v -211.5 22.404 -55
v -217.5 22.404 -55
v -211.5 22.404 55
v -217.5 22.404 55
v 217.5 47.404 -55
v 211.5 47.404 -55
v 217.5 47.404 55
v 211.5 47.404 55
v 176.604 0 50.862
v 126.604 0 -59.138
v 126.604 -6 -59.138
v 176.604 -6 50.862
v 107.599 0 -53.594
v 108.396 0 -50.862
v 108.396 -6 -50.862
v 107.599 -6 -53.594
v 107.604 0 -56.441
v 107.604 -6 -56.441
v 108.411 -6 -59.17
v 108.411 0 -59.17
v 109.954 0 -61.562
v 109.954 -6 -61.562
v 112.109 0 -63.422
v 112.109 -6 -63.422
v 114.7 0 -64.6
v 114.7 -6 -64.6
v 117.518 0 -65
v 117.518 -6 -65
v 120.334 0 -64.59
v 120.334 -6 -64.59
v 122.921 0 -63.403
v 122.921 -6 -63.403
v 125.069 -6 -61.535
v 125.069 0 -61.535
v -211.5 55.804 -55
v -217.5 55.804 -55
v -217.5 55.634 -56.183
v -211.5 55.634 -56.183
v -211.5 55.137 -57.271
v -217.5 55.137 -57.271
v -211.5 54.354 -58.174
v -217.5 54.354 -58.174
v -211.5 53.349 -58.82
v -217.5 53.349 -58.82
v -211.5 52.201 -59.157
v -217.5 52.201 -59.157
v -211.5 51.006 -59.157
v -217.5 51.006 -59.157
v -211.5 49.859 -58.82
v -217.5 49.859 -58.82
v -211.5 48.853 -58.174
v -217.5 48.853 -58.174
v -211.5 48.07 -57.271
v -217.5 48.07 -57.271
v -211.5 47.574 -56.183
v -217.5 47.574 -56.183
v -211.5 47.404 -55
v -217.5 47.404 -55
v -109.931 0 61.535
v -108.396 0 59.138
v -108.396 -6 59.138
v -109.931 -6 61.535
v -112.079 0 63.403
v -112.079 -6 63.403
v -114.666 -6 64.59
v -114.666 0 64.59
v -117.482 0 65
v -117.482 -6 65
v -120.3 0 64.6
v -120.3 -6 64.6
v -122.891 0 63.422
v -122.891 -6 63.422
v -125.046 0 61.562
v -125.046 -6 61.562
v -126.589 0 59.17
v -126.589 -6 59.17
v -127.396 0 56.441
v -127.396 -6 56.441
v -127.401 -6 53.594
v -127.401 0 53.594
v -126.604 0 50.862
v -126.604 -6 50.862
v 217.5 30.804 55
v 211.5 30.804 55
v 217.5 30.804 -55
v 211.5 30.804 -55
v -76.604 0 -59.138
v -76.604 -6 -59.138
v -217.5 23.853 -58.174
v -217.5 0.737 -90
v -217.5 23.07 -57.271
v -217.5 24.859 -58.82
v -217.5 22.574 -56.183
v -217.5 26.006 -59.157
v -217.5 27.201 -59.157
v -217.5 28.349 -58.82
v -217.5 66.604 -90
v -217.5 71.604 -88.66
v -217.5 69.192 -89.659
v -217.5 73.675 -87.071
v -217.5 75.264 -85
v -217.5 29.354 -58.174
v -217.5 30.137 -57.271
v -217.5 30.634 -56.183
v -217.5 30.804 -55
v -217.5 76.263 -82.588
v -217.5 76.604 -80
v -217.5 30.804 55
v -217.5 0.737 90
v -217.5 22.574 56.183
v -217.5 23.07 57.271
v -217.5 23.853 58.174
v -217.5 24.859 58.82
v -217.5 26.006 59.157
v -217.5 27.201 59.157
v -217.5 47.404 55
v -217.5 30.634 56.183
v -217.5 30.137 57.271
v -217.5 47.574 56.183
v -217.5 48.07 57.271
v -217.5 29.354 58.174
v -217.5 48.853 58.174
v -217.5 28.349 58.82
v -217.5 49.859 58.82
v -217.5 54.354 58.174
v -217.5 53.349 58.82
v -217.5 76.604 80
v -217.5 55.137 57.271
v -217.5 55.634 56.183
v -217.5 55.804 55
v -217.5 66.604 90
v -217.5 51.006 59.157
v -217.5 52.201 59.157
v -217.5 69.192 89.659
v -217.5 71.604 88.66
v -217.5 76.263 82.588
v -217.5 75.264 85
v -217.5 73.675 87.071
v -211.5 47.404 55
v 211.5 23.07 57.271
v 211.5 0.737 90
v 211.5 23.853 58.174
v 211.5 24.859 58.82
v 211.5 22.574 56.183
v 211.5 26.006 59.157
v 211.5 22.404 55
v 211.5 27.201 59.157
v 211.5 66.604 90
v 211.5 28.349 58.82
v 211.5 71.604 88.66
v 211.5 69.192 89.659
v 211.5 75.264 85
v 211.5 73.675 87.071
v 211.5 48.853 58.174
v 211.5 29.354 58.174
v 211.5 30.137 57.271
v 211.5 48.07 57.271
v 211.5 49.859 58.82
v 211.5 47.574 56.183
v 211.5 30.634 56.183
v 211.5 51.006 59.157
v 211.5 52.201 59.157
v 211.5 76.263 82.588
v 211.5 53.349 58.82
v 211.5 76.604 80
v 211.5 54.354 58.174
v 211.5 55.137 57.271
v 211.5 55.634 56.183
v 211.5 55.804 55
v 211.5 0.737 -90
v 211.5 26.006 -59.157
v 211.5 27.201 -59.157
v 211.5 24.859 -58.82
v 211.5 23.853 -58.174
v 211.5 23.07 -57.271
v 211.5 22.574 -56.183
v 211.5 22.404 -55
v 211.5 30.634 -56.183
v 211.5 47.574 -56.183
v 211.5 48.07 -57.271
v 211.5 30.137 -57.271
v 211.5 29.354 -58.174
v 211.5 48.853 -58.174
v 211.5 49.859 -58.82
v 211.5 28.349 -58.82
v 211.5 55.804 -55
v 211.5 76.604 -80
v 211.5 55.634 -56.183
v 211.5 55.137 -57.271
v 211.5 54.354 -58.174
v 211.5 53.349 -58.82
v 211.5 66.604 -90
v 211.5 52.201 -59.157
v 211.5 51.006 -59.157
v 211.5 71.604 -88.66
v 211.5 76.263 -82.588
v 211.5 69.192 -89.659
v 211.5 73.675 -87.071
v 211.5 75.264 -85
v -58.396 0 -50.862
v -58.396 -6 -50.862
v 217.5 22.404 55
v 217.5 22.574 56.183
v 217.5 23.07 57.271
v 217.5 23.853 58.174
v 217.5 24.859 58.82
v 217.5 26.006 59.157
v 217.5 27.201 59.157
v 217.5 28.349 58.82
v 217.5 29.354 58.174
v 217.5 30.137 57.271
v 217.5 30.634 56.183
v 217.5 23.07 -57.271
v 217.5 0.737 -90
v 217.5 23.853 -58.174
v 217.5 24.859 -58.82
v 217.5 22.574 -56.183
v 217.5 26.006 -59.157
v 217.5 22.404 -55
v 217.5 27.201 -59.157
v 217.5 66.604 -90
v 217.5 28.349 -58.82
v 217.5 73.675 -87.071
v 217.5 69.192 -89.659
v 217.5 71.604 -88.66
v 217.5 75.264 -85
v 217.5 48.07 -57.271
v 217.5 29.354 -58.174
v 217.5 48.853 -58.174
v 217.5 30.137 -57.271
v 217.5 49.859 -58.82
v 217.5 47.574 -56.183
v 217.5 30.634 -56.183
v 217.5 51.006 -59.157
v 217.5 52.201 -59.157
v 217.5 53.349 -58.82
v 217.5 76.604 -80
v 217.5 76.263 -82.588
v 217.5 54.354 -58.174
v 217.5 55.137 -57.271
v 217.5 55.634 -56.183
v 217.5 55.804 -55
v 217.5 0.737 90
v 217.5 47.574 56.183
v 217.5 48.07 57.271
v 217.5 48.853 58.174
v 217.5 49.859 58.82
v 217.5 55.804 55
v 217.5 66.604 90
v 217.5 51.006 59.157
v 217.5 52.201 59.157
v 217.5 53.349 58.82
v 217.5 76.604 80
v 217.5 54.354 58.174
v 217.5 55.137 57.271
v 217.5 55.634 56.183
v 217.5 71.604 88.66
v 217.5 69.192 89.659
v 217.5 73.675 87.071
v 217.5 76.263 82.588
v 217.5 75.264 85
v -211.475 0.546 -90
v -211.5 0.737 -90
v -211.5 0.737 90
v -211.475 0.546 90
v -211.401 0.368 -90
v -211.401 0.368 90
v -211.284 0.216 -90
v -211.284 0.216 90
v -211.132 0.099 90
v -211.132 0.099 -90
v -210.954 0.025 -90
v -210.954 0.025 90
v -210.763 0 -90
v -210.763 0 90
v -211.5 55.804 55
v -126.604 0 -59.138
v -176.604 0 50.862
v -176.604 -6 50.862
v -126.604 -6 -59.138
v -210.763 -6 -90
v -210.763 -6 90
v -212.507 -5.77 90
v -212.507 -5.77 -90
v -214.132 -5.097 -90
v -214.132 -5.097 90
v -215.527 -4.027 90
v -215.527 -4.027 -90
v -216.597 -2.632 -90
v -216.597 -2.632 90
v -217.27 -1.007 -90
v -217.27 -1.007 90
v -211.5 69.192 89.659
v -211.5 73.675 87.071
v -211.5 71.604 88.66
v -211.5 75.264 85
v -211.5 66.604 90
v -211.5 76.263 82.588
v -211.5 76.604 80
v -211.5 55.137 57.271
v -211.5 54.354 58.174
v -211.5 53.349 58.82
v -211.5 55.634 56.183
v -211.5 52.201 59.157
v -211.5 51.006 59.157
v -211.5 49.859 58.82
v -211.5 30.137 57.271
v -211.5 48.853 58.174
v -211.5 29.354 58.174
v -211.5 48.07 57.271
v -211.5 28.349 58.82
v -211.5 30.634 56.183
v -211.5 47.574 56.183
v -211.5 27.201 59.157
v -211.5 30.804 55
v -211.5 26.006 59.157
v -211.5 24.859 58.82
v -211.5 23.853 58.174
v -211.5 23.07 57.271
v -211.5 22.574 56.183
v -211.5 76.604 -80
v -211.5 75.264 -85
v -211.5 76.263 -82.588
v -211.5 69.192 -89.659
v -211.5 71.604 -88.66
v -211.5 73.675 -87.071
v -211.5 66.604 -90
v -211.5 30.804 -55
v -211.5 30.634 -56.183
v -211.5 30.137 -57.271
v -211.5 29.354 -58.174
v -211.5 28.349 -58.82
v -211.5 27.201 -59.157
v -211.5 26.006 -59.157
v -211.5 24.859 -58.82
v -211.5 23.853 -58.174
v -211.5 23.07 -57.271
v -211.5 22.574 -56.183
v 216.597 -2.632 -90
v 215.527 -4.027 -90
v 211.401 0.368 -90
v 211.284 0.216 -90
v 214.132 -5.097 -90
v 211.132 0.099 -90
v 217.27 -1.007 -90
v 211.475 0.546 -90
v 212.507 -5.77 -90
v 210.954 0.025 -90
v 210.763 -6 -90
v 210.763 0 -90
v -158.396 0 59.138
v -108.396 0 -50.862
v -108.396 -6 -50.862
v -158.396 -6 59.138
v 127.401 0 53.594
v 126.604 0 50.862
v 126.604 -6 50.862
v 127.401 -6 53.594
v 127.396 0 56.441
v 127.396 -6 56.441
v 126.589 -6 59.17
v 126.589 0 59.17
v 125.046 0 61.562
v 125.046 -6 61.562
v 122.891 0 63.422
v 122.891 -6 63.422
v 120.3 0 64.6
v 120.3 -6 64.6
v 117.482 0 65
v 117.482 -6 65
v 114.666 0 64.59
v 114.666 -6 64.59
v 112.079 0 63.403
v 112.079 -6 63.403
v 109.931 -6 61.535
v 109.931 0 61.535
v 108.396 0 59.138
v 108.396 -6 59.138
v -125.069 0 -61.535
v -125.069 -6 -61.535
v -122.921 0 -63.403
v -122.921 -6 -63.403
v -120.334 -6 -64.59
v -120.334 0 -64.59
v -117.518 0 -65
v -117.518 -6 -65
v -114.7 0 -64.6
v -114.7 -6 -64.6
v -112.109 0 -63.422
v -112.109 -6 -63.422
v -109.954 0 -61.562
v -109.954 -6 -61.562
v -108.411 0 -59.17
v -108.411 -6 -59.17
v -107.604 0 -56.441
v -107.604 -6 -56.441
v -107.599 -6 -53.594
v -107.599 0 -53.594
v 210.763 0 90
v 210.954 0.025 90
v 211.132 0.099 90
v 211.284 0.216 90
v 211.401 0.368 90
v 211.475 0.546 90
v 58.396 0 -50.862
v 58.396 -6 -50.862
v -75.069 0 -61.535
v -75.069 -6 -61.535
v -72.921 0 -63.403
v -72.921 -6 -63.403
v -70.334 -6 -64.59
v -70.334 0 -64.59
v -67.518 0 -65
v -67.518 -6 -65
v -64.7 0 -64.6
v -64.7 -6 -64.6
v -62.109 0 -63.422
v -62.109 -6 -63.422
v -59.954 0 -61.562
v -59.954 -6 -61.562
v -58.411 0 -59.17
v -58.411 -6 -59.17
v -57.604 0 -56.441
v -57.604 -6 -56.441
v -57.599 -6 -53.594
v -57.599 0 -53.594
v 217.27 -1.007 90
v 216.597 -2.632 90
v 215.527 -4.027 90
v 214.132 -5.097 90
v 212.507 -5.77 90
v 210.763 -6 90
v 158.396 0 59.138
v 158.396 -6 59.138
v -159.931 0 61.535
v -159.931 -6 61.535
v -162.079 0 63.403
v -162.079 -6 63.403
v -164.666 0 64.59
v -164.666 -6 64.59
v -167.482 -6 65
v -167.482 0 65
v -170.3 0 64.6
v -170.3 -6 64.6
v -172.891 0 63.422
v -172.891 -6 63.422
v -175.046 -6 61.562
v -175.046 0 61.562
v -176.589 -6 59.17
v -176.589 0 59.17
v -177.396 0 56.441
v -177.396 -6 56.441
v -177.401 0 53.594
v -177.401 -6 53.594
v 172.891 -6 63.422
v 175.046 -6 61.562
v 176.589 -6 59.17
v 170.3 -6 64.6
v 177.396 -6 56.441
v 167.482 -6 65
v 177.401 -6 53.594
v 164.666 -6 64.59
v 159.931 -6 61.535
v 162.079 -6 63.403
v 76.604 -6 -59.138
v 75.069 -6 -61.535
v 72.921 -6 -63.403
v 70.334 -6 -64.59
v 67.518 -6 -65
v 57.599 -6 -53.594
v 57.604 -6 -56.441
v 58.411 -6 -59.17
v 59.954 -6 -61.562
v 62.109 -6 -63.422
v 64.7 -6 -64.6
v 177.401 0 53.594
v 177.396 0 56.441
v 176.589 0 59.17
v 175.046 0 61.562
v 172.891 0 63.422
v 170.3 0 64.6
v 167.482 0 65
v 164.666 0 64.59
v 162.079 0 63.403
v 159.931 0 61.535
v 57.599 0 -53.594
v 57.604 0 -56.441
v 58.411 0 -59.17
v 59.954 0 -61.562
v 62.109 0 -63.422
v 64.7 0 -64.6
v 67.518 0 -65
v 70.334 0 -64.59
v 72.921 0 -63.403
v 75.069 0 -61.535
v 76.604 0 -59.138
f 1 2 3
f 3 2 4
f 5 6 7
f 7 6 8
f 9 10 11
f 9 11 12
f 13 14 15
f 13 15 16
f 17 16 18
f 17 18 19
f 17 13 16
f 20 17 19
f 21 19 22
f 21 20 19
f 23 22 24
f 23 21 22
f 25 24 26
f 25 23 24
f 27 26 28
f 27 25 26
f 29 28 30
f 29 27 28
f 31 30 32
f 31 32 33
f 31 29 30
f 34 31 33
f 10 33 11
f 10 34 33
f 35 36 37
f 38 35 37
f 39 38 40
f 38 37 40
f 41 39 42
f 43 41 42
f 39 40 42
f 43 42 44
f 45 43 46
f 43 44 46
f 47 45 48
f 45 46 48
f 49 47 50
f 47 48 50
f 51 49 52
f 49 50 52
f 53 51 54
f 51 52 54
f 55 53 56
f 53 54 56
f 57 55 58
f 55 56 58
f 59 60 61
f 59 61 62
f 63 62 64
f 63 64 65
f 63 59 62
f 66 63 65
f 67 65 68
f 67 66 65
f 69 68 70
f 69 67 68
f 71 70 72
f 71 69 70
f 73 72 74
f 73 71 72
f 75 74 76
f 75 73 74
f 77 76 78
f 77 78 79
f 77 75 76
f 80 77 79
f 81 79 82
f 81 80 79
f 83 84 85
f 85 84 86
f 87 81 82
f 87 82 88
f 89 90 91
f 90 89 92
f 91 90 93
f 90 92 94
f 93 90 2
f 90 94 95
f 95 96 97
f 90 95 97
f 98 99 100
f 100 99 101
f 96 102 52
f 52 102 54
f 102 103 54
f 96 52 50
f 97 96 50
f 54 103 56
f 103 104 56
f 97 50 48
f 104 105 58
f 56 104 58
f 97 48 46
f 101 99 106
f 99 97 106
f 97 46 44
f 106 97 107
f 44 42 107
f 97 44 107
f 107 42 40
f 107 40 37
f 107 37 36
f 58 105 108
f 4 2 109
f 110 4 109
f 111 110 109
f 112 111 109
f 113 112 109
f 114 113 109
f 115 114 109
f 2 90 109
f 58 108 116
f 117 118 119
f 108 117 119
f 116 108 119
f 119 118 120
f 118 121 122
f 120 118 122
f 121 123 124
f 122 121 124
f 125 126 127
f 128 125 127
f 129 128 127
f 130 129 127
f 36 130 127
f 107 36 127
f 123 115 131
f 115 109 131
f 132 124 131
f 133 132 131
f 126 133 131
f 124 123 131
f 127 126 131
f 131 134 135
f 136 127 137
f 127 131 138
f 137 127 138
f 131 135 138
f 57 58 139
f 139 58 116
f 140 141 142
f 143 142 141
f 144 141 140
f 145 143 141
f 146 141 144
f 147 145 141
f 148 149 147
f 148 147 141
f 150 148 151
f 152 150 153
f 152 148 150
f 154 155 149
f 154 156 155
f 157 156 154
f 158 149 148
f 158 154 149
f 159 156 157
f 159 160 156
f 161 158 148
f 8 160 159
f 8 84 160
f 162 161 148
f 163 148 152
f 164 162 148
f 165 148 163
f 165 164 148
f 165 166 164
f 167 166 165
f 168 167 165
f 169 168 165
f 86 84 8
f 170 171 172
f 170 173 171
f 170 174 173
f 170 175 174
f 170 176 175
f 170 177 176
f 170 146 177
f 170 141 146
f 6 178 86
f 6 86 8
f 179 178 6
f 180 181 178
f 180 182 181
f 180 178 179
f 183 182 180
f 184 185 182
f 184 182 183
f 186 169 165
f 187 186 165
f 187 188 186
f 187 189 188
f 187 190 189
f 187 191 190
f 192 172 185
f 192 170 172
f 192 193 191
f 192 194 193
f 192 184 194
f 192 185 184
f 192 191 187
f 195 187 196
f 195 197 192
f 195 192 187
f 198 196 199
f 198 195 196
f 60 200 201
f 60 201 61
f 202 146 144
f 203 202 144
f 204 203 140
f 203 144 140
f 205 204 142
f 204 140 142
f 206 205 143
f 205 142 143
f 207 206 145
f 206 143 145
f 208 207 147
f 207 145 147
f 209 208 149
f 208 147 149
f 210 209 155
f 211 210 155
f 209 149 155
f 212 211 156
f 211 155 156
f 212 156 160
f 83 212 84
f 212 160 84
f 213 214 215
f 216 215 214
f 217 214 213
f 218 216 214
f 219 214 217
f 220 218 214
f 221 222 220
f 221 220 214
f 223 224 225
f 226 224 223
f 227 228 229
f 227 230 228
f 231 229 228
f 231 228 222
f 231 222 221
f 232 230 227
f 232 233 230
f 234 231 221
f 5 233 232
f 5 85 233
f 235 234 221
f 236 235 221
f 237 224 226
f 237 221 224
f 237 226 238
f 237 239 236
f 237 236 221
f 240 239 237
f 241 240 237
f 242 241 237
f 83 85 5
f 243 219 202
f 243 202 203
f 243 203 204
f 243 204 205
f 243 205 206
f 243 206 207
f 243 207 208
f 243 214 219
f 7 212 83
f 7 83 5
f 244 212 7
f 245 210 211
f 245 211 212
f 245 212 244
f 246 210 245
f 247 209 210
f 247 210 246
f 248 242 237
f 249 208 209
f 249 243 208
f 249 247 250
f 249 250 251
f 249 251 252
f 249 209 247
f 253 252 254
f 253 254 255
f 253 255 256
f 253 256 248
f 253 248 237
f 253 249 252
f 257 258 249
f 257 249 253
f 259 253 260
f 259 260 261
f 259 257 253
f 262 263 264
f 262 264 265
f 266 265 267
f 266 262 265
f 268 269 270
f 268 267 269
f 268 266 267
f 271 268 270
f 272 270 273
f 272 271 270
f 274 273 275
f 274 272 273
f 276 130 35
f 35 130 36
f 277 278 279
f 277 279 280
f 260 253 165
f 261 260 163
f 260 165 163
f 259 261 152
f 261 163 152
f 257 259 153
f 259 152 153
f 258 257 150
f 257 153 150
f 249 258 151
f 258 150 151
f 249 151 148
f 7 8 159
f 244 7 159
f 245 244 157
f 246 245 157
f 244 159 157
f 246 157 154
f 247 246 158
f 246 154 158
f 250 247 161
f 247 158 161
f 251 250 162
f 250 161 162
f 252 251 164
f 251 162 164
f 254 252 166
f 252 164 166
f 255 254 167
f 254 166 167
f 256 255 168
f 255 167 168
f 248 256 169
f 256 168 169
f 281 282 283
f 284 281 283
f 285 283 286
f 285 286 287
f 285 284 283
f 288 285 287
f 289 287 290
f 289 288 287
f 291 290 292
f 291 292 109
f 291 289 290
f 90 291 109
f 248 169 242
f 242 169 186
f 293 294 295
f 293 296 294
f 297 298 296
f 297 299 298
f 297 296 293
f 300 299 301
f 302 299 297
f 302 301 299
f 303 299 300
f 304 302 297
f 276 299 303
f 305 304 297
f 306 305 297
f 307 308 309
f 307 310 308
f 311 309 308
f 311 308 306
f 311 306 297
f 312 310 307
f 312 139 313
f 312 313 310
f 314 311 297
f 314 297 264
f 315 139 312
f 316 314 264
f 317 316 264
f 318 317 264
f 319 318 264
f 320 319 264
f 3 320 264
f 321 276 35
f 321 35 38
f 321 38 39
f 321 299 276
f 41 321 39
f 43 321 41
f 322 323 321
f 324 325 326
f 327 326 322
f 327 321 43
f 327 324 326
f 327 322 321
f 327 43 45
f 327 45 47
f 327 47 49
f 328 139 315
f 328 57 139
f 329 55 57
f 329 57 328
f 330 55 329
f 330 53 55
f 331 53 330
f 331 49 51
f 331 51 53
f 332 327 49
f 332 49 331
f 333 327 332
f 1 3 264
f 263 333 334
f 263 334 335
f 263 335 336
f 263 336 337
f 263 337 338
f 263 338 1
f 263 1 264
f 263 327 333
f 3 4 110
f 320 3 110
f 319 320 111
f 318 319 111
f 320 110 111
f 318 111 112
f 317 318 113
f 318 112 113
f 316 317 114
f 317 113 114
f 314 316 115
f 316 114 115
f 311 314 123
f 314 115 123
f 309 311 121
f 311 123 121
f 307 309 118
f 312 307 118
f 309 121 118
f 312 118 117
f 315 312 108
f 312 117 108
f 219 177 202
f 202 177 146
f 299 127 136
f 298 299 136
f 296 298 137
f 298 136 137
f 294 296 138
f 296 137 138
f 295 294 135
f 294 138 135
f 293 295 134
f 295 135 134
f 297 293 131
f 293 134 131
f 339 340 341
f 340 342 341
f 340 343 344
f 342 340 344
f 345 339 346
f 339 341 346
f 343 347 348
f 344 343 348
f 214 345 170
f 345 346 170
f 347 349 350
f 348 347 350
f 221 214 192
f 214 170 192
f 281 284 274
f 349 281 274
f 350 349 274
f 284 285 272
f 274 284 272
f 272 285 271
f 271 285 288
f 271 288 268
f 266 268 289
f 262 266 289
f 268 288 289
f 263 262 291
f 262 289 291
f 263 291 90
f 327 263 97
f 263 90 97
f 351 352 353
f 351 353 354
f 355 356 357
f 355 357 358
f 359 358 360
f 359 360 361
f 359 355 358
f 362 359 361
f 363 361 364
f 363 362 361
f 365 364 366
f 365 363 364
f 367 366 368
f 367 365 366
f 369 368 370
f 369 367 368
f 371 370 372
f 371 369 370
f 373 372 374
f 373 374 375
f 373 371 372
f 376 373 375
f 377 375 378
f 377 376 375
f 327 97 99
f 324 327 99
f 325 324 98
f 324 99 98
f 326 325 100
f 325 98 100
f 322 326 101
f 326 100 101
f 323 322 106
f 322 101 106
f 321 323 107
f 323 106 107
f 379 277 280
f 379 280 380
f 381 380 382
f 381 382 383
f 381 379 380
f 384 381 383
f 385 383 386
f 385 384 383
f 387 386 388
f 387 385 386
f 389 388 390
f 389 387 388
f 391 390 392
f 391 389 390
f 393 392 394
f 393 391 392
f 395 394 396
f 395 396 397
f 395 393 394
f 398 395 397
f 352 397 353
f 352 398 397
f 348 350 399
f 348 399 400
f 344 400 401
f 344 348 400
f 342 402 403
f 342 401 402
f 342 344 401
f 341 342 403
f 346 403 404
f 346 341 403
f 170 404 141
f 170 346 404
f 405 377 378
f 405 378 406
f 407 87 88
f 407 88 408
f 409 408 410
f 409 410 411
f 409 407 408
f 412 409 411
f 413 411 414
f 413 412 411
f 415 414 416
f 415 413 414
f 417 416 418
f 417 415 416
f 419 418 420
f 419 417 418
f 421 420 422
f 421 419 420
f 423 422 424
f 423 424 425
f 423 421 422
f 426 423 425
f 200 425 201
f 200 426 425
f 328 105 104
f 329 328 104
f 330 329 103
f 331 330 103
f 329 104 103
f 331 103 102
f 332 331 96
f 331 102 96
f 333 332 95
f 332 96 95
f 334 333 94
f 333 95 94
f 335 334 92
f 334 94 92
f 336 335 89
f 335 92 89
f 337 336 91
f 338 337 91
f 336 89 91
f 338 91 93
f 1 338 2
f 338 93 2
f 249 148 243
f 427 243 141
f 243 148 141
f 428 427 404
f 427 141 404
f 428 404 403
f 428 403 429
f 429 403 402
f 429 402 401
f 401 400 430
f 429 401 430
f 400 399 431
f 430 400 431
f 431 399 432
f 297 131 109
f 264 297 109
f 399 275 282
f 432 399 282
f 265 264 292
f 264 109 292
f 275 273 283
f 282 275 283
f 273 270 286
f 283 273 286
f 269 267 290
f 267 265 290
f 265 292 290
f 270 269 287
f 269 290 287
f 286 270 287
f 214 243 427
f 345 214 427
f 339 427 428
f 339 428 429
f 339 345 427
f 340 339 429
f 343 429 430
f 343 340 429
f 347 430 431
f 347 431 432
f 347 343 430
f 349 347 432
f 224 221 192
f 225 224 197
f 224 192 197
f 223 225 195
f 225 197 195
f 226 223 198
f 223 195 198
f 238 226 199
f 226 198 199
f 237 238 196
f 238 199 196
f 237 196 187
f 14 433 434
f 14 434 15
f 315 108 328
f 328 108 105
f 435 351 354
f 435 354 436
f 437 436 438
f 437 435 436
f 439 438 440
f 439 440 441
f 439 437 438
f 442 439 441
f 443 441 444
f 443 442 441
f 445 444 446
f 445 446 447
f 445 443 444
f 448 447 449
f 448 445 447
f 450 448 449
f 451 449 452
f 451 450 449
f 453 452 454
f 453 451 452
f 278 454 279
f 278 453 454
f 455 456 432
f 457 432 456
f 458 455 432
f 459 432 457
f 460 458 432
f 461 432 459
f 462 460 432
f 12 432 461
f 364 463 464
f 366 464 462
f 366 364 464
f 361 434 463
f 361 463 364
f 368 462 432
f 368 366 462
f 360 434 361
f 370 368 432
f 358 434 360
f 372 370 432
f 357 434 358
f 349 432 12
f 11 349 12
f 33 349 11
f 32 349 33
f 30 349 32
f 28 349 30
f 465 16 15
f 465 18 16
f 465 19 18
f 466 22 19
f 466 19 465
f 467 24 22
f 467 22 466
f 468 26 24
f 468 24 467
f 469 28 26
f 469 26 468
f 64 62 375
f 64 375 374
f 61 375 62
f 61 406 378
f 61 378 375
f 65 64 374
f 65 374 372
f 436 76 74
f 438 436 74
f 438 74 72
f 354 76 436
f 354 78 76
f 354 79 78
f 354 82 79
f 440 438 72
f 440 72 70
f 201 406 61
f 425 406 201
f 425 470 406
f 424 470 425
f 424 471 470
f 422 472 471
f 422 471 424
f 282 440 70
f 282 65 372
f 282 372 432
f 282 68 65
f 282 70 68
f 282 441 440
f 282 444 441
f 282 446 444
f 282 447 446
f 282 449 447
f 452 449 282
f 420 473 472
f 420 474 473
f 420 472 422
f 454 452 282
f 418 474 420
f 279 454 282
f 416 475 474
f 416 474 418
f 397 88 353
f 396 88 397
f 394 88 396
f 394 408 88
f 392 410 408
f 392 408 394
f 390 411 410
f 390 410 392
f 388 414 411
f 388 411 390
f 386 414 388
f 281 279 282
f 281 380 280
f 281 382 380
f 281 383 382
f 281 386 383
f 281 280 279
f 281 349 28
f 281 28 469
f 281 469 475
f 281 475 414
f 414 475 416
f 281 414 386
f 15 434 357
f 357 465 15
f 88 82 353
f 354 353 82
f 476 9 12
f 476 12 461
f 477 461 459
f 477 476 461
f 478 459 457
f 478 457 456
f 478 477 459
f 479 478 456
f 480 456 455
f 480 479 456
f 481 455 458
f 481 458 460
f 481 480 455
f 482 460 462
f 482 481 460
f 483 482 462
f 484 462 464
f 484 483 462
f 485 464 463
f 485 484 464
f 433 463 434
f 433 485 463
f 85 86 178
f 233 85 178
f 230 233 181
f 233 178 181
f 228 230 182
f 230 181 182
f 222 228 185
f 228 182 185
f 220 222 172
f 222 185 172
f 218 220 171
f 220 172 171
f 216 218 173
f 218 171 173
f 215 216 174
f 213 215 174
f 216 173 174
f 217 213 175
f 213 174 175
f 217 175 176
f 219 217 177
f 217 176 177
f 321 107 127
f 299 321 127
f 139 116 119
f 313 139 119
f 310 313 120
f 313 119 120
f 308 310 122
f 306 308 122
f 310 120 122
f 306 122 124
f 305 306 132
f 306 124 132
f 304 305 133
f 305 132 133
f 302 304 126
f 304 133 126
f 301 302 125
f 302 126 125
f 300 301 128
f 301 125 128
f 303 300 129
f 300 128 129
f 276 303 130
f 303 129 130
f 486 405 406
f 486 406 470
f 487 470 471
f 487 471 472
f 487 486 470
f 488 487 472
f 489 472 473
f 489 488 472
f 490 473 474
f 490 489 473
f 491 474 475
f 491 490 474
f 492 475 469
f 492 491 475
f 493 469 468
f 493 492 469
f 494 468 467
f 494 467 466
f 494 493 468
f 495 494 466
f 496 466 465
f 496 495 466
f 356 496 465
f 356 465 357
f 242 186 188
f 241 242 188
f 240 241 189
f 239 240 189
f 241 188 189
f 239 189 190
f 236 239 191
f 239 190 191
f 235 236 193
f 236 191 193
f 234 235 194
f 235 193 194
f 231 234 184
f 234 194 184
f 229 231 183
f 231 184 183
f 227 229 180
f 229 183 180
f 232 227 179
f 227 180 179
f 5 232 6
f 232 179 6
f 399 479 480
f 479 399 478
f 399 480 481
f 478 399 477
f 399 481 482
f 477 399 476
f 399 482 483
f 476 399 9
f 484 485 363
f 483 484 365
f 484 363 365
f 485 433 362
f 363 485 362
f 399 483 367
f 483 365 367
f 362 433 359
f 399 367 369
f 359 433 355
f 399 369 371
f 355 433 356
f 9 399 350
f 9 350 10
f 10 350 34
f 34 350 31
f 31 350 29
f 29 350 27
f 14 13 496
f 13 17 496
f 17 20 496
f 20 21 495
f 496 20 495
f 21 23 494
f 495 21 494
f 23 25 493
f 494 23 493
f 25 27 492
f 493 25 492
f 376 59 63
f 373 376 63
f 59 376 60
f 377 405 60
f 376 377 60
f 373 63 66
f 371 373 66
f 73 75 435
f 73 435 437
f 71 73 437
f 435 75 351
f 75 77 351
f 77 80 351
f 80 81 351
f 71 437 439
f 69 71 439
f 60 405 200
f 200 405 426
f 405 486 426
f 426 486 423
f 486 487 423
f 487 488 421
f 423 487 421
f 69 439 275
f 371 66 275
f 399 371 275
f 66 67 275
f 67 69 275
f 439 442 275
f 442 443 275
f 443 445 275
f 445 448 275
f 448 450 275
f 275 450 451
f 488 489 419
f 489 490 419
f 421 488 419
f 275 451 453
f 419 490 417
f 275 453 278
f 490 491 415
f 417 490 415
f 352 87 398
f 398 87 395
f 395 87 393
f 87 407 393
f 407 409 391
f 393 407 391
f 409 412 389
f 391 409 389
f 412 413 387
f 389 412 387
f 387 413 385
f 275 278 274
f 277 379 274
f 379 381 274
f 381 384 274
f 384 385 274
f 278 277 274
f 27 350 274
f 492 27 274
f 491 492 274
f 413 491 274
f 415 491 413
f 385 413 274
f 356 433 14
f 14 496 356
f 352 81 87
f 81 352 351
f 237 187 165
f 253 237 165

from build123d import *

# Parameters (mm, degrees)
BASE_FLANGE1_DEPTH         = 6
SKETCHED_START             = -292.5
SKETCHED_BEND1_OUTLINE_W   = 6
SKETCHED_BEND1_OUTLINE_H   = 180
SKETCHED_BEND1_DEPTH       = 75
SKETCHED_START_2           = 217.5
SKETCHED_BEND1_2_OUTLINE_W = 6
SKETCHED_BEND1_2_OUTLINE_H = 180
SKETCHED_BEND1_2_DEPTH     = 75
SKETCHED_START_3           = -217.5
SKETCHED_BEND1_3_DEPTH     = 6.7366
SKETCHED_START_4           = 210.7634
SKETCHED_BEND1_4_DEPTH     = 6.7366
SKETCHED_START_5           = -91
SKETCHED_BEND1_5_DEPTH     = 182


with BuildPart() as part:
    # Base-Flange1: sheet metal written as solids
    # Sketch1 → Base-Flange1 (new body)
    with BuildSketch(Plane(origin=(0, 0, 0), x_dir=(1, 0, 0), z_dir=(0, 1, 0))):
        with BuildLine():
            Line((-282.5, 90), (282.5, 90))
            ThreePointArc((282.5, 90), (289.571067812, 87.071067812), (292.5, 80))
            Line((292.5, 80), (292.5, -80))
            ThreePointArc((292.5, -80), (289.571067812, -87.071067812), (282.5, -90))
            Line((282.5, -90), (-282.5, -90))
            ThreePointArc((-282.5, -90), (-289.571067812, -87.071067812), (-292.5, -80))
            Line((-292.5, -80), (-292.5, 80))
            ThreePointArc((-292.5, 80), (-289.571067812, 87.071067812), (-282.5, 90))
        make_face()
        with BuildLine():
            Line((-263.3, 55), (-263.3, -55))
            ThreePointArc((-263.3, -55), (-267.5, -59.2), (-271.7, -55))
            Line((-271.7, -55), (-271.7, 55))
            ThreePointArc((-271.7, 55), (-267.5, 59.2), (-263.3, 55))
        make_face(mode=Mode.SUBTRACT)
        with BuildLine():
            Line((-238.3, 55), (-238.3, -55))
            ThreePointArc((-238.3, -55), (-242.5, -59.2), (-246.7, -55))
            Line((-246.7, -55), (-246.7, 55))
            ThreePointArc((-246.7, 55), (-242.5, 59.2), (-238.3, 55))
        make_face(mode=Mode.SUBTRACT)
        with BuildLine():
            Line((246.7, 55), (246.7, -55))
            ThreePointArc((246.7, -55), (242.5, -59.2), (238.3, -55))
            Line((238.3, -55), (238.3, 55))
            ThreePointArc((238.3, 55), (242.5, 59.2), (246.7, 55))
        make_face(mode=Mode.SUBTRACT)
        with BuildLine():
            Line((271.7, 55), (271.7, -55))
            ThreePointArc((271.7, -55), (267.5, -59.2), (263.3, -55))
            Line((263.3, -55), (263.3, 55))
            ThreePointArc((263.3, 55), (267.5, 59.2), (271.7, 55))
        make_face(mode=Mode.SUBTRACT)
        with BuildLine():
            Line((-108.396335225, 50.861970557), (-158.396335225, -59.138029443))
            ThreePointArc((-158.396335225, -59.138029443), (-171.638029443, -64.103664775), (-176.603664775, -50.861970557))
            Line((-176.603664775, -50.861970557), (-126.603664775, 59.138029443))
            ThreePointArc((-126.603664775, 59.138029443), (-113.361970557, 64.103664775), (-108.396335225, 50.861970557))
        make_face(mode=Mode.SUBTRACT)
        with BuildLine():
            Line((-58.396335225, 50.861970557), (-108.396335225, -59.138029443))
            ThreePointArc((-108.396335225, -59.138029443), (-121.638029443, -64.103664775), (-126.603664775, -50.861970557))
            Line((-126.603664775, -50.861970557), (-76.603664775, 59.138029443))
            ThreePointArc((-76.603664775, 59.138029443), (-63.361970557, 64.103664775), (-58.396335225, 50.861970557))
        make_face(mode=Mode.SUBTRACT)
        with BuildLine():
            Line((76.603664775, 59.138029443), (126.603664775, -50.861970557))
            ThreePointArc((126.603664775, -50.861970557), (121.638029443, -64.103664775), (108.396335225, -59.138029443))
            Line((108.396335225, -59.138029443), (58.396335225, 50.861970557))
            ThreePointArc((58.396335225, 50.861970557), (63.361970557, 64.103664775), (76.603664775, 59.138029443))
        make_face(mode=Mode.SUBTRACT)
        with BuildLine():
            Line((126.603664775, 59.138029443), (176.603664775, -50.861970557))
            ThreePointArc((176.603664775, -50.861970557), (171.638029443, -64.103664775), (158.396335225, -59.138029443))
            Line((158.396335225, -59.138029443), (108.396335225, 50.861970557))
            ThreePointArc((108.396335225, 50.861970557), (113.361970557, 64.103664775), (126.603664775, 59.138029443))
        make_face(mode=Mode.SUBTRACT)
    extrude(amount=-BASE_FLANGE1_DEPTH)

    # Sketched Bend1: read off the stored shape, not the designer's step
    # Sketched Bend1 outline → Sketched Bend1 (cut)
    with BuildSketch(Plane.YZ.offset(SKETCHED_START)):
        with Locations((-3, 0)):
            Rectangle(SKETCHED_BEND1_OUTLINE_W, SKETCHED_BEND1_OUTLINE_H)
    extrude(amount=SKETCHED_BEND1_DEPTH, mode=Mode.SUBTRACT)

    # Sketched Bend1 2 outline → Sketched Bend1 2 (cut)
    with BuildSketch(Plane.YZ.offset(SKETCHED_START_2)):
        with Locations((-3, 0)):
            Rectangle(SKETCHED_BEND1_2_OUTLINE_W, SKETCHED_BEND1_2_OUTLINE_H)
    extrude(amount=SKETCHED_BEND1_2_DEPTH, mode=Mode.SUBTRACT)

    # Sketched Bend1 3 outline → Sketched Bend1 3 (add)
    with BuildSketch(Plane.YZ.offset(SKETCHED_START_3)):
        with BuildLine():
            Line((0, 90), (0, -90))
            Line((0, -90), (66.603762445, -90))
            ThreePointArc((66.603762445, -90), (73.674830257, -87.071067812), (76.603762445, -80))
            Line((76.603762445, -80), (76.603762445, 80))
            ThreePointArc((76.603762445, 80), (73.674830257, 87.071067812), (66.603762445, 90))
            Line((66.603762445, 90), (0, 90))
        make_face()
        with BuildLine():
            ThreePointArc((22.403762445, 55), (26.603762445, 59.2), (30.803762445, 55))
            Line((30.803762445, 55), (30.803762445, -55))
            ThreePointArc((30.803762445, -55), (26.603762445, -59.2), (22.403762445, -55))
            Line((22.403762445, -55), (22.403762445, 55))
        make_face(mode=Mode.SUBTRACT)
        with BuildLine():
            ThreePointArc((47.403762445, 55), (51.603762445, 59.2), (55.803762445, 55))
            Line((55.803762445, 55), (55.803762445, -55))
            ThreePointArc((55.803762445, -55), (51.603762445, -59.2), (47.403762445, -55))
            Line((47.403762445, -55), (47.403762445, 55))
        make_face(mode=Mode.SUBTRACT)
    extrude(amount=SKETCHED_BEND1_3_DEPTH)

    # Sketched Bend1 4 outline → Sketched Bend1 4 (add)
    with BuildSketch(Plane.YZ.offset(SKETCHED_START_4)):
        with BuildLine():
            Line((0, 90), (0, -90))
            Line((0, -90), (66.603762445, -90))
            ThreePointArc((66.603762445, -90), (73.674830257, -87.071067812), (76.603762445, -80))
            Line((76.603762445, -80), (76.603762445, 80))
            ThreePointArc((76.603762445, 80), (73.674830257, 87.071067812), (66.603762445, 90))
            Line((66.603762445, 90), (0, 90))
        make_face()
        with BuildLine():
            ThreePointArc((22.403762445, 55), (26.603762445, 59.2), (30.803762445, 55))
            Line((30.803762445, 55), (30.803762445, -55))
            ThreePointArc((30.803762445, -55), (26.603762445, -59.2), (22.403762445, -55))
            Line((22.403762445, -55), (22.403762445, 55))
        make_face(mode=Mode.SUBTRACT)
        with BuildLine():
            ThreePointArc((47.403762445, 55), (51.603762445, 59.2), (55.803762445, 55))
            Line((55.803762445, 55), (55.803762445, -55))
            ThreePointArc((55.803762445, -55), (51.603762445, -59.2), (47.403762445, -55))
            Line((47.403762445, -55), (47.403762445, 55))
        make_face(mode=Mode.SUBTRACT)
    extrude(amount=SKETCHED_BEND1_4_DEPTH)

    # Sketched Bend1 5 outline → Sketched Bend1 5 (cut)
    with BuildSketch(Plane.XY.offset(SKETCHED_START_5)):
        with BuildLine():
            Line((-217.5, -6), (-210.7634, -6))
            ThreePointArc((-210.7634, -6), (-215.526895542, -4.026895542), (-217.5, 0.7366))
            Line((-217.5, 0.7366), (-217.5, -6))
        make_face()
        with BuildLine():
            ThreePointArc((217.5, 0.7366), (215.526895542, -4.026895542), (210.7634, -6))
            Line((210.7634, -6), (217.5, -6))
            Line((217.5, -6), (217.5, 0.7366))
        make_face()
        with BuildLine():
            Line((-210.7634, 0), (-210.7634, 76.603762445))
            Line((-210.7634, 76.603762445), (-211.5, 76.603762445))
            Line((-211.5, 76.603762445), (-211.5, 0.7366))
            ThreePointArc((-211.5, 0.7366), (-211.284254855, 0.215745145), (-210.7634, 0))
        make_face()
        with BuildLine():
            ThreePointArc((210.7634, 0), (211.284254855, 0.215745145), (211.5, 0.7366))
            Line((211.5, 0.7366), (211.5, 76.603762445))
            Line((211.5, 76.603762445), (210.7634, 76.603762445))
            Line((210.7634, 76.603762445), (210.7634, 0))
        make_face()
    extrude(amount=SKETCHED_BEND1_5_DEPTH, mode=Mode.SUBTRACT)


solid = part.part
